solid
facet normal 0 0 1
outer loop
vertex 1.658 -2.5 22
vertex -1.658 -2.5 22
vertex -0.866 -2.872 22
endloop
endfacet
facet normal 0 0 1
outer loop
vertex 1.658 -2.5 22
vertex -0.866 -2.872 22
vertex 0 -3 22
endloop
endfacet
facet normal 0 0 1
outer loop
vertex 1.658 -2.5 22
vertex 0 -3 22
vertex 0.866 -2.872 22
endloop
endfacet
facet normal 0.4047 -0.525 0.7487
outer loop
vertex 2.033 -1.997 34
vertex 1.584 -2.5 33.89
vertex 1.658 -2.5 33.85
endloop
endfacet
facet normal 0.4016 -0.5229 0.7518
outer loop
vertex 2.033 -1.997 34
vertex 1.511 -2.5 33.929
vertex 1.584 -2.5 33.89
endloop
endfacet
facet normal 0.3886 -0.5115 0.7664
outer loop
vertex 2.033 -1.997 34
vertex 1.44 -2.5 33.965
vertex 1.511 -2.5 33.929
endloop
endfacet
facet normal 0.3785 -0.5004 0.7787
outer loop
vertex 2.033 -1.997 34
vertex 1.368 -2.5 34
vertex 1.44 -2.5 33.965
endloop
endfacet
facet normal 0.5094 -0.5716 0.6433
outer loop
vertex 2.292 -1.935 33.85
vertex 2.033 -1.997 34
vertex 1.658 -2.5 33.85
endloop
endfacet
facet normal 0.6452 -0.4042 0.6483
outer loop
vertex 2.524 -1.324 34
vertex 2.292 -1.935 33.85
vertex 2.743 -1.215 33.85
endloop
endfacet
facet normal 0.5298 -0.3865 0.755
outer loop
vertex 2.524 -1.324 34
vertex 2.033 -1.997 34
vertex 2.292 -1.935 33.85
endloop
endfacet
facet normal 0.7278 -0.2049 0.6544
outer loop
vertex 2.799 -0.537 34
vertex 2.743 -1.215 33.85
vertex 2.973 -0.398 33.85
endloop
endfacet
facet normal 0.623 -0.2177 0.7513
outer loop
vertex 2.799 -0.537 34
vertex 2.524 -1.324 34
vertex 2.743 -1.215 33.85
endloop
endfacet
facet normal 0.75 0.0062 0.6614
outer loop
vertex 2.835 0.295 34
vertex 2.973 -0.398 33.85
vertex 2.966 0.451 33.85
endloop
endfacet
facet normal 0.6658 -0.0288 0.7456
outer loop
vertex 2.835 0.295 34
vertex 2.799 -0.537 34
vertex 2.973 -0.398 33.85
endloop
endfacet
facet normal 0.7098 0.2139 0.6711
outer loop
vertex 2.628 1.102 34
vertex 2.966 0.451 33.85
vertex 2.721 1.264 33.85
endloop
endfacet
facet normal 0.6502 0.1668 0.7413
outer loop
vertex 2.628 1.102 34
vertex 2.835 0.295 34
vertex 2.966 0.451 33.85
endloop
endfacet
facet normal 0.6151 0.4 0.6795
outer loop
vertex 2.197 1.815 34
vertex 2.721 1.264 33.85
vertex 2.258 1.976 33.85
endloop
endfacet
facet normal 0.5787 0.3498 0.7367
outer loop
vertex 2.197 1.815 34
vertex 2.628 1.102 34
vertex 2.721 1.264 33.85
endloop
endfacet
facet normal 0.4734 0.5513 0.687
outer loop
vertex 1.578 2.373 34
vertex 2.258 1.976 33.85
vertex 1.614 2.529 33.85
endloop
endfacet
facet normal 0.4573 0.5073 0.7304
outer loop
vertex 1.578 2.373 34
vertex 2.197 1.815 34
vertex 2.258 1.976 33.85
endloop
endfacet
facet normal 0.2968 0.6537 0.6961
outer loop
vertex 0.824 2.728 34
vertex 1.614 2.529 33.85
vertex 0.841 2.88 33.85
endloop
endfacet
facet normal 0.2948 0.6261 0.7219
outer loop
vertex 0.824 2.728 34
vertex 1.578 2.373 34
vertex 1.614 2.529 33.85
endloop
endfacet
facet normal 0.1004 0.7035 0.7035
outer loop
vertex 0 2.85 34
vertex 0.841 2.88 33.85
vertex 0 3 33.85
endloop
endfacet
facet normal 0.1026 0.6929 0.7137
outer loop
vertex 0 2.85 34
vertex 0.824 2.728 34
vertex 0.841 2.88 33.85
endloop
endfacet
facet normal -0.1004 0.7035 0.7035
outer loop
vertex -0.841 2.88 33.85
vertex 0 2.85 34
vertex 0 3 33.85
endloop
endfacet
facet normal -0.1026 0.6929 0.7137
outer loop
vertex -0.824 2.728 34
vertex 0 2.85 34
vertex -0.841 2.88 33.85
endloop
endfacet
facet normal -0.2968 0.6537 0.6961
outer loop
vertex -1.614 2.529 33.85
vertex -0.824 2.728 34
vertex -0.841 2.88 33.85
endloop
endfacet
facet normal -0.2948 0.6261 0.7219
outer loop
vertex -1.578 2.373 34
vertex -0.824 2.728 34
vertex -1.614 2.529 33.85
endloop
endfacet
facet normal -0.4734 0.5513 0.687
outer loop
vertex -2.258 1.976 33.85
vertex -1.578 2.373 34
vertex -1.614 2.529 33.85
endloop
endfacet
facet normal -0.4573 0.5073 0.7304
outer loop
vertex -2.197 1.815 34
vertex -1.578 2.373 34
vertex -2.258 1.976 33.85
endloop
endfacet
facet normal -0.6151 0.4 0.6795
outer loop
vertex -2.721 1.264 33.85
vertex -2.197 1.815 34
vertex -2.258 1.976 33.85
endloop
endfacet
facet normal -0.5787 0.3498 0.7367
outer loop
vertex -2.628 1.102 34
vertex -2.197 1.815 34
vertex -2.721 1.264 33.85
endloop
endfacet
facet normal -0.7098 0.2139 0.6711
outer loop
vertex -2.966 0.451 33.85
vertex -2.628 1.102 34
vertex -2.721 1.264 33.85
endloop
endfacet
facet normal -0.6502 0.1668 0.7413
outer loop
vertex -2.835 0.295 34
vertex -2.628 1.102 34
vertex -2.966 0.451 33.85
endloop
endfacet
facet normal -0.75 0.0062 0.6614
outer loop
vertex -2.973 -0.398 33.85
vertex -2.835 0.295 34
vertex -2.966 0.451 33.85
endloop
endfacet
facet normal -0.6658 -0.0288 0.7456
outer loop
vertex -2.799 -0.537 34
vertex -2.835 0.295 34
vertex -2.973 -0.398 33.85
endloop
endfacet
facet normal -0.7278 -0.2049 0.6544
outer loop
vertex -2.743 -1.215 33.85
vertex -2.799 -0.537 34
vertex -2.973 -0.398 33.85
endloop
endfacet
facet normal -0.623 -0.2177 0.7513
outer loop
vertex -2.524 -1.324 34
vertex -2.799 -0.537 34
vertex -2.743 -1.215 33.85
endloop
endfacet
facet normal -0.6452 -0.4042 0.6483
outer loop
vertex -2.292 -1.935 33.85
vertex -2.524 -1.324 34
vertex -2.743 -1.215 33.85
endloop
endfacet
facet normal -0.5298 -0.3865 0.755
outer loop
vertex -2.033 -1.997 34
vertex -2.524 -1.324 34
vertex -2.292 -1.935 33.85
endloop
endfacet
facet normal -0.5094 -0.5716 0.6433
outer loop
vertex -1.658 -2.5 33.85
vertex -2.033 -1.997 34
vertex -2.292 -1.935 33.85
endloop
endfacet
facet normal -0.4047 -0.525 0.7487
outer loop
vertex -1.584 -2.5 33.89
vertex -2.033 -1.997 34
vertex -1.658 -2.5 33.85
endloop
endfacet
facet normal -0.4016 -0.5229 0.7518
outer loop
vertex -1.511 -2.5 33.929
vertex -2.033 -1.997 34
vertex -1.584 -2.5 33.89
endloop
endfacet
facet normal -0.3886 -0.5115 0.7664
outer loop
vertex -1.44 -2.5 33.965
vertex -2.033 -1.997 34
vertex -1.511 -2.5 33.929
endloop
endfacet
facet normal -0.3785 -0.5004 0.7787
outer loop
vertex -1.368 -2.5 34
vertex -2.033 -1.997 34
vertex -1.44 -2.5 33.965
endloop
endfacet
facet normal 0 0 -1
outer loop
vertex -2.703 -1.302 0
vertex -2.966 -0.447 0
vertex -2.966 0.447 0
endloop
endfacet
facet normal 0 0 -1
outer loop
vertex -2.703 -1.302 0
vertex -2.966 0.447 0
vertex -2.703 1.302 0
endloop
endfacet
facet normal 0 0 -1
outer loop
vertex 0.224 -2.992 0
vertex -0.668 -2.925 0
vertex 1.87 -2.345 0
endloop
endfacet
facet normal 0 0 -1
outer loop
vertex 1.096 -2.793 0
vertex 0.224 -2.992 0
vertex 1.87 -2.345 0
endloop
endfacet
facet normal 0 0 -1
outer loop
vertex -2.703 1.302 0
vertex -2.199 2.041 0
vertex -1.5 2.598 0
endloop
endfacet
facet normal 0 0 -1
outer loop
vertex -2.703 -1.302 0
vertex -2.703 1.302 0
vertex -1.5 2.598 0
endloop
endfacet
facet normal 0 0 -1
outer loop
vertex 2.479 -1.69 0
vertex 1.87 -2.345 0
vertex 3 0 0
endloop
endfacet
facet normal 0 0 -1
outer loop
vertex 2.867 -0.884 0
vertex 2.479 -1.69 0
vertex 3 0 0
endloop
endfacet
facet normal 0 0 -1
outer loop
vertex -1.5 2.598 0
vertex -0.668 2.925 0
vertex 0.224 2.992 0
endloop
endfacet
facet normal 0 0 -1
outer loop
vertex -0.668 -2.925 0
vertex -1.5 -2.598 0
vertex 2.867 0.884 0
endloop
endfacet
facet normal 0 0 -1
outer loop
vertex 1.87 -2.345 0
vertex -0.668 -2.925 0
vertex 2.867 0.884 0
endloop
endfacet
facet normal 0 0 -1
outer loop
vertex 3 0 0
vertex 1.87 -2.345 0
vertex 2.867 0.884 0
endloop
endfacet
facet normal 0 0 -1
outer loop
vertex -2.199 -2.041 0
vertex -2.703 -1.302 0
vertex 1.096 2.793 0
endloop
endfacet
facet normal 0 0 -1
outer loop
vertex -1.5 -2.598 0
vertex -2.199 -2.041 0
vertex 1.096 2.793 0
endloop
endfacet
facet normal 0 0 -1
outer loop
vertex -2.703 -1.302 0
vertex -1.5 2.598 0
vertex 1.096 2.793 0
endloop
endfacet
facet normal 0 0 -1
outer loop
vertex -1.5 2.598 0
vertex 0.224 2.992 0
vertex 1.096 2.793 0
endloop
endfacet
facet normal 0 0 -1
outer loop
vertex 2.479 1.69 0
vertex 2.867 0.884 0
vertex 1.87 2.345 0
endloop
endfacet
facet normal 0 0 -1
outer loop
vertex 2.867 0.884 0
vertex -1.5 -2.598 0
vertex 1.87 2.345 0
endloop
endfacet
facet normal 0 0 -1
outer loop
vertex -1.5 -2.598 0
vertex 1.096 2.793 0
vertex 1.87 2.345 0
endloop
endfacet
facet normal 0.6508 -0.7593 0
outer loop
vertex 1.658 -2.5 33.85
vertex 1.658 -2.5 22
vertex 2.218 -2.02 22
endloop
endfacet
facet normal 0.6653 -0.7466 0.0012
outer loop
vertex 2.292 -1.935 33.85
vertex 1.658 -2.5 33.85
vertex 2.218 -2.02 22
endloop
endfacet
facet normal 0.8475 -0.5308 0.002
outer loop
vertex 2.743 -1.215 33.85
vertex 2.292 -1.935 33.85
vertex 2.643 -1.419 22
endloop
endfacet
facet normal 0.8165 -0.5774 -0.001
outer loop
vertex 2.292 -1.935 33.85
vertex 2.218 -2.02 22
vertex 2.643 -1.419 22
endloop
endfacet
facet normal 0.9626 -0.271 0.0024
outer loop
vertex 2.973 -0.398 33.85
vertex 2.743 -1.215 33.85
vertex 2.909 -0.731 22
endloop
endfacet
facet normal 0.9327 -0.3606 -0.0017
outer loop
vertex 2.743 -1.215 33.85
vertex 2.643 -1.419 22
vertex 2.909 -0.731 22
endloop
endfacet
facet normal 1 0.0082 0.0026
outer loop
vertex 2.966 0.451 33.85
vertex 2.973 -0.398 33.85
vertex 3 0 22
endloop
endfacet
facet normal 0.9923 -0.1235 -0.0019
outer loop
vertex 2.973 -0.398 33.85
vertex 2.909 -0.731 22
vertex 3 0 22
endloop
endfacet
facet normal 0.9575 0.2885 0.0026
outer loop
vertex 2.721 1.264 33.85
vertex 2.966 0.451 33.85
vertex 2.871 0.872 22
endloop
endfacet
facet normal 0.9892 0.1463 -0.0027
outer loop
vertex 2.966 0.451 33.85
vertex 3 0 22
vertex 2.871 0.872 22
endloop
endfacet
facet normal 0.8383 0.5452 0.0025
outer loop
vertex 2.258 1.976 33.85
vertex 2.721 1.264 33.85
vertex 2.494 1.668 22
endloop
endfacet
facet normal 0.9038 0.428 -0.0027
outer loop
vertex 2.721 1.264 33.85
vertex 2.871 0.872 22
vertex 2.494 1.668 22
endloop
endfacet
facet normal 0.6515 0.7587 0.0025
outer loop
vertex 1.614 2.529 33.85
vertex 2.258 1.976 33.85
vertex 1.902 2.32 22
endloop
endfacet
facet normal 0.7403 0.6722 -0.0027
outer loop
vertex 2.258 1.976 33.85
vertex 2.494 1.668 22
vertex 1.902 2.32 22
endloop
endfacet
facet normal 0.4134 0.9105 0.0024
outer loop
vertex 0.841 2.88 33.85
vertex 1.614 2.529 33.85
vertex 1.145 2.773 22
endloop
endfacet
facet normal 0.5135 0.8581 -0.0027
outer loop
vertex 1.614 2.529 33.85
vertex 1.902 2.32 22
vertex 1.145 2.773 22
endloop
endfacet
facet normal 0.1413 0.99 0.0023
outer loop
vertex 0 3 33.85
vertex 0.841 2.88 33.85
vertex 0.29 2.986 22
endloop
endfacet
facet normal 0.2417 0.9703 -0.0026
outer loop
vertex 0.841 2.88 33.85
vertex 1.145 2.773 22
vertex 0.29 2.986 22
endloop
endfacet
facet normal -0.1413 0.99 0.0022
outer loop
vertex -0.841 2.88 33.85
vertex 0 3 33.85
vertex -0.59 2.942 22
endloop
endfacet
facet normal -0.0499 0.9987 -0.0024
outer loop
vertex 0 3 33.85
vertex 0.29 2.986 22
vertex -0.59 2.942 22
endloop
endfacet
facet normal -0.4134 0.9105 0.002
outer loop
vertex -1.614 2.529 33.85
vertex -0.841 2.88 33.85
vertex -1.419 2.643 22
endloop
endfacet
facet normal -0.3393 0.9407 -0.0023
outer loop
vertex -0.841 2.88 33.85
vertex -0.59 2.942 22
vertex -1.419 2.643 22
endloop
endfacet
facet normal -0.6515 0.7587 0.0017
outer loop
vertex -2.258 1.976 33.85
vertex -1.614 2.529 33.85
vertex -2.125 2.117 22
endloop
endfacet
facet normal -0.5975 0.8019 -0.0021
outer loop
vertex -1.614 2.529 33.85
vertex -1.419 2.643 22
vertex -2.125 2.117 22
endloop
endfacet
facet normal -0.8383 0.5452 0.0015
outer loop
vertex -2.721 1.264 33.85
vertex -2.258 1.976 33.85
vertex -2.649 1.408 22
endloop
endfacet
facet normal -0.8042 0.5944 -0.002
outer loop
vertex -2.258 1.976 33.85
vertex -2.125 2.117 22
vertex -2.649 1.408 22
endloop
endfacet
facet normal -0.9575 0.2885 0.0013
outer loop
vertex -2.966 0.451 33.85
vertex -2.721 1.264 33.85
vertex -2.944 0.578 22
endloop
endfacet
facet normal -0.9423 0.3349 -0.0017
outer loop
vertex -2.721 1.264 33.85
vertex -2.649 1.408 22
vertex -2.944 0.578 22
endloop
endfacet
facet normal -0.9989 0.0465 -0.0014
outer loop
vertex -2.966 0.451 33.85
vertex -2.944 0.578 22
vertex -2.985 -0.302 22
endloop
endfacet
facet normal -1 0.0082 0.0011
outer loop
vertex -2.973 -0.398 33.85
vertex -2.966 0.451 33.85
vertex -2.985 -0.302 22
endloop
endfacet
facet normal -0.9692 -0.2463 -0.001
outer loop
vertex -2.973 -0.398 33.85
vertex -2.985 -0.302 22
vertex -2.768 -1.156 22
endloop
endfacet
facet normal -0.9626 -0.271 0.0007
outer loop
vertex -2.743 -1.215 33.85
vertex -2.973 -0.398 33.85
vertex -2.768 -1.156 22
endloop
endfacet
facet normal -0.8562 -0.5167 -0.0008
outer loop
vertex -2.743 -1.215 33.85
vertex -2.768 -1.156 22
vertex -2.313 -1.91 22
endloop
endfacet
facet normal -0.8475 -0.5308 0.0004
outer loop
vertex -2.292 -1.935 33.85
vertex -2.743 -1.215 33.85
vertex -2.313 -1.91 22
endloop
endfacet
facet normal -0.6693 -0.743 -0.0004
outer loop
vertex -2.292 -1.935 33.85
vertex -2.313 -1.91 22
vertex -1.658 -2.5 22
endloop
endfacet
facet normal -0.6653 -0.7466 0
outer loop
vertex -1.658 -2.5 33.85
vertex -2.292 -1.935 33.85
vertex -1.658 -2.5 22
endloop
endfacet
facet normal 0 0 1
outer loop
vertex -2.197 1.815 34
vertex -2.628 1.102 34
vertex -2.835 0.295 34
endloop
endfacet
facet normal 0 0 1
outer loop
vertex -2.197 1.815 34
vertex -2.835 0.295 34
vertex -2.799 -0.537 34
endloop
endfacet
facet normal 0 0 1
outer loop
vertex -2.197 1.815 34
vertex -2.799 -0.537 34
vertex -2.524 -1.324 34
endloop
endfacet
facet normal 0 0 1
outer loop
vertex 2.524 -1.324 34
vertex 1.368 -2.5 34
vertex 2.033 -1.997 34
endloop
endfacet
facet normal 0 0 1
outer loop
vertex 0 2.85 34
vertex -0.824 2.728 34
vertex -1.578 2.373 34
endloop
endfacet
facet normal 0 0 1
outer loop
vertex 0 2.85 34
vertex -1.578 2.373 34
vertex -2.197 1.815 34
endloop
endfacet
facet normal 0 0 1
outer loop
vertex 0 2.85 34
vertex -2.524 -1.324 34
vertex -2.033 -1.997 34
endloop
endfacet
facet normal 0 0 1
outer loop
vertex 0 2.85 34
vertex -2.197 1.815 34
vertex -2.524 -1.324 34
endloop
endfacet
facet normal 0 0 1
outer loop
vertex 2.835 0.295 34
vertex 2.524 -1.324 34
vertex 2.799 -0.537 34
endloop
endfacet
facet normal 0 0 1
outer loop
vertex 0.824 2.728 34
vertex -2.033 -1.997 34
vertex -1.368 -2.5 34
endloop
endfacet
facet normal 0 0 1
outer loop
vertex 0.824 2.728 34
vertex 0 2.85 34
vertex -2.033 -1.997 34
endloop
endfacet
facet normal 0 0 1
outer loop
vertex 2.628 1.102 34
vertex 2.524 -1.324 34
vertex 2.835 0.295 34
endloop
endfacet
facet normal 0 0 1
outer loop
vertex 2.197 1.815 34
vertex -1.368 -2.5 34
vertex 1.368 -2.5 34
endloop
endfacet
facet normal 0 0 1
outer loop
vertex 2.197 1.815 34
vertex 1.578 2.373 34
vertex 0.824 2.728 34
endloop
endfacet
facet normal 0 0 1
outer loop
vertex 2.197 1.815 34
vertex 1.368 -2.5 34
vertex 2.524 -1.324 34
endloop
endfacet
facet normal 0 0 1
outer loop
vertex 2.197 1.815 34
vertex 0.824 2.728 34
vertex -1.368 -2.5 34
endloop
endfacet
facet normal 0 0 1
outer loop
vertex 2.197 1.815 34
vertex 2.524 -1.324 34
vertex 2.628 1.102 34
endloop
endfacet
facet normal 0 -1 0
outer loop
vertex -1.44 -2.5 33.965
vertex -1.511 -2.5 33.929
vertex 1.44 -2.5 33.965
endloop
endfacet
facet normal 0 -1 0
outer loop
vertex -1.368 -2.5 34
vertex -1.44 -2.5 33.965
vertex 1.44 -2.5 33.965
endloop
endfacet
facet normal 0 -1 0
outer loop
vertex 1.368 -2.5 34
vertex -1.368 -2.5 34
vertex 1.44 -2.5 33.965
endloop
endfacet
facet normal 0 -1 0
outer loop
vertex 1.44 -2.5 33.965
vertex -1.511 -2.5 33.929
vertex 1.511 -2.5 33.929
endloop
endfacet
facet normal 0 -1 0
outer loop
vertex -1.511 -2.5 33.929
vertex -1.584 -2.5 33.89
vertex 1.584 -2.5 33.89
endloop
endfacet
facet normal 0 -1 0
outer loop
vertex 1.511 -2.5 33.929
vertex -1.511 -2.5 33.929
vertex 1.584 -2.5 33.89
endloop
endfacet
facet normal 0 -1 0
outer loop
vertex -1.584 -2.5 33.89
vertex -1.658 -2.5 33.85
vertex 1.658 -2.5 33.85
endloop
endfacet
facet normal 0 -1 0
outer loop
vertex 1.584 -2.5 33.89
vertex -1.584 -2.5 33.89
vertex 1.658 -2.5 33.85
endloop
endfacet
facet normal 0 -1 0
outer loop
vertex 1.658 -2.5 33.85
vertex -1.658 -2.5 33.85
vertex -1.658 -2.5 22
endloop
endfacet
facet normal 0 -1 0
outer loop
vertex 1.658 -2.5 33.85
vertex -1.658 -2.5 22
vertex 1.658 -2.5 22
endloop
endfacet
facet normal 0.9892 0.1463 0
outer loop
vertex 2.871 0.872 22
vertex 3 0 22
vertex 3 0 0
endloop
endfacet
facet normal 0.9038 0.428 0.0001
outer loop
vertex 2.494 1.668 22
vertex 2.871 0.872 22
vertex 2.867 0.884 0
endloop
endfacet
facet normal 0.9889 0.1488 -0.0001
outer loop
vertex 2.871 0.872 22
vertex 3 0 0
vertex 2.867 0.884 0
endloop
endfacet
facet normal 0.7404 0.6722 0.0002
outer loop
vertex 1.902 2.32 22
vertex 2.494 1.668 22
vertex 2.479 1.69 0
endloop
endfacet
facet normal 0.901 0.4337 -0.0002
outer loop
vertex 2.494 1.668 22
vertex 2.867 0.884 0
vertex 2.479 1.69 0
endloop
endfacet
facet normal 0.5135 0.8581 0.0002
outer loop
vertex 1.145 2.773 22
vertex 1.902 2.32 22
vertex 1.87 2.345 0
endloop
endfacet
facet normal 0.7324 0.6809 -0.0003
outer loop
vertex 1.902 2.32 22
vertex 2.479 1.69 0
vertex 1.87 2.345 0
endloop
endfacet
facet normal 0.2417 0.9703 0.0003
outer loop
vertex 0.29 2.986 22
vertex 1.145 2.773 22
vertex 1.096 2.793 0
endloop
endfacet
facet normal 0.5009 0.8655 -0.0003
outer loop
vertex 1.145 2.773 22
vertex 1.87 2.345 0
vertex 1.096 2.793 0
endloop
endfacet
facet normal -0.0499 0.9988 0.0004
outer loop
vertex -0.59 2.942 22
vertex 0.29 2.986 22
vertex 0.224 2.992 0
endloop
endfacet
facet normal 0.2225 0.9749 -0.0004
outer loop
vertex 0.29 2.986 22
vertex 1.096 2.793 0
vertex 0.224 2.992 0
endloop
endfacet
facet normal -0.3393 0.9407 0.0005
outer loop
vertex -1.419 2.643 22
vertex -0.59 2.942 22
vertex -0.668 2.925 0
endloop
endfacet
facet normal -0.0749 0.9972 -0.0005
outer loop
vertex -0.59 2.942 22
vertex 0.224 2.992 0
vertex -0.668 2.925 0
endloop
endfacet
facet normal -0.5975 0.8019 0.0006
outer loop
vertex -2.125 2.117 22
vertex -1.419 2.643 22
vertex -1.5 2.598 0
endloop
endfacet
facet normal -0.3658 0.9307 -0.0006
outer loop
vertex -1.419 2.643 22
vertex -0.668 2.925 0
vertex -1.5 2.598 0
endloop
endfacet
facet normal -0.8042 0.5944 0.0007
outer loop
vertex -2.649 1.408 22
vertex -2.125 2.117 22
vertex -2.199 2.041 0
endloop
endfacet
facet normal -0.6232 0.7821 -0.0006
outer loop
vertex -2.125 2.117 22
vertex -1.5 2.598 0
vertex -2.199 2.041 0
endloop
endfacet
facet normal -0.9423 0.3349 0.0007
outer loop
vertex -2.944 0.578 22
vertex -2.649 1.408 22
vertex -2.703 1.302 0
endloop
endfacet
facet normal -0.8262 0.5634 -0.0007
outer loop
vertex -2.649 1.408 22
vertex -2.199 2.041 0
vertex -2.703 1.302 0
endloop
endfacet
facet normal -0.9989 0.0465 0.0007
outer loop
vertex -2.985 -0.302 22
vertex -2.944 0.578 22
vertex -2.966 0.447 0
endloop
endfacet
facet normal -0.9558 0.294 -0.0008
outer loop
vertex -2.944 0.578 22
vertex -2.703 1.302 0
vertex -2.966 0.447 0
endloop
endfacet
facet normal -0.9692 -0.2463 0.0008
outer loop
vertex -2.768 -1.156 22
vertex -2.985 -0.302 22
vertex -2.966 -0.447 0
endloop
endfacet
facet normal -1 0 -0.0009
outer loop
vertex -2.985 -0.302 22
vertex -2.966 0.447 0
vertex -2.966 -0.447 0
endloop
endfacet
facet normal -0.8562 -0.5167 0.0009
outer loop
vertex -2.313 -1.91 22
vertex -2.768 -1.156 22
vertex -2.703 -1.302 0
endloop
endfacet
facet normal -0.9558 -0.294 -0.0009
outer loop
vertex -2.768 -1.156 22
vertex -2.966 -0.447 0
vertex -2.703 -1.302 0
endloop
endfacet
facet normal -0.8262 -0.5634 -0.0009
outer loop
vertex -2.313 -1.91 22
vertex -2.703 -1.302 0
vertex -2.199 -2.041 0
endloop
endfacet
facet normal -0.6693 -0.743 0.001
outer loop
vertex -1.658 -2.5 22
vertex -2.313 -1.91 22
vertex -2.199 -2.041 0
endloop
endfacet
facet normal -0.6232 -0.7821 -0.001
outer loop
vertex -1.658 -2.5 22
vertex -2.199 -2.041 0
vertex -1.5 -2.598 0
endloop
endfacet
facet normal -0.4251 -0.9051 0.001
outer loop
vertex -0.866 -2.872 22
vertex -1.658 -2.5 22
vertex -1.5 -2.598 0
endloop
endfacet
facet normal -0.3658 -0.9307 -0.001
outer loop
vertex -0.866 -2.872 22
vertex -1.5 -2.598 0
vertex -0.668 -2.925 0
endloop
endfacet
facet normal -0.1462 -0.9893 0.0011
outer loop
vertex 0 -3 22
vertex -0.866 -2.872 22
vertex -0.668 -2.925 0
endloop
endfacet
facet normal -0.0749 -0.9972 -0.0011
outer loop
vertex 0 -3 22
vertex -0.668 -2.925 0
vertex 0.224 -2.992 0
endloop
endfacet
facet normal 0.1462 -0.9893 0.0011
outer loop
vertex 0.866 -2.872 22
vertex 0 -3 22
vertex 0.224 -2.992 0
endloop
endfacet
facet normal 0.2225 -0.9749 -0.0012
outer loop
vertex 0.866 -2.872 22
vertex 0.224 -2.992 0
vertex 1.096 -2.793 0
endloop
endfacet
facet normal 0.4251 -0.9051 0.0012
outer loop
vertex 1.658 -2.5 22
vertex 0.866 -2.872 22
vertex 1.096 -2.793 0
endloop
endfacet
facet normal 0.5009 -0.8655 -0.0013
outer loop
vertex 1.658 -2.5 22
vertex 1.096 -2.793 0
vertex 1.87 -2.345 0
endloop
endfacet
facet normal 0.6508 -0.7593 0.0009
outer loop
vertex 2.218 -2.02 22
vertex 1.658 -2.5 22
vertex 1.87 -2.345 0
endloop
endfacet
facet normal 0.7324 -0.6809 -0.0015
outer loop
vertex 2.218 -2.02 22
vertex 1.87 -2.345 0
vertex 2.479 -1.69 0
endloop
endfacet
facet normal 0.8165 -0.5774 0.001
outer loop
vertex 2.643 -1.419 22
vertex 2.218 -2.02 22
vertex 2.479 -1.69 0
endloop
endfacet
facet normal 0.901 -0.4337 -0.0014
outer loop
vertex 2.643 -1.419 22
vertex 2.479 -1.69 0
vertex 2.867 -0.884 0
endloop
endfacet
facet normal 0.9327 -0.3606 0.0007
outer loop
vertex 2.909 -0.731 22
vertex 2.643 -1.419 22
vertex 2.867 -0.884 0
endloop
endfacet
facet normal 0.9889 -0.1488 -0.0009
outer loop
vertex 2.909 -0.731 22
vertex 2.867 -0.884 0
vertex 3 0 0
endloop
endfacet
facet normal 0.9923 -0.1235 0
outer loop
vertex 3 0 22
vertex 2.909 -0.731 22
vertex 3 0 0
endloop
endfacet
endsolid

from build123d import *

# Parameters (mm, degrees)
SKETCH1_R           = 3
BOSS_EXTRUDE1_DEPTH = 22
BOSS_EXTRUDE2_DEPTH = 12
CHAMFER1_SIZE       = 0.15


with BuildPart() as part:
    # Sketch1 → Boss-Extrude1 (new body)
    with BuildSketch(Plane.XY):
        Circle(SKETCH1_R)
    extrude(amount=BOSS_EXTRUDE1_DEPTH)

    # Sketch2 → Boss-Extrude2 (add)
    with BuildSketch(Plane.XY.offset(22)):
        with BuildLine():
            ThreePointArc((1.658312395, -2.5), (0, 3), (-1.658312395, -2.5))
            Line((-1.658312395, -2.5), (1.658312395, -2.5))
        make_face()
    extrude(amount=BOSS_EXTRUDE2_DEPTH)

    # Chamfer1
    chamfer1_edges = [part.edges().sort_by_distance(p)[0] for p in [
        (0, 3, 34),
    ]]
    chamfer(chamfer1_edges, length=CHAMFER1_SIZE)


solid = part.part
